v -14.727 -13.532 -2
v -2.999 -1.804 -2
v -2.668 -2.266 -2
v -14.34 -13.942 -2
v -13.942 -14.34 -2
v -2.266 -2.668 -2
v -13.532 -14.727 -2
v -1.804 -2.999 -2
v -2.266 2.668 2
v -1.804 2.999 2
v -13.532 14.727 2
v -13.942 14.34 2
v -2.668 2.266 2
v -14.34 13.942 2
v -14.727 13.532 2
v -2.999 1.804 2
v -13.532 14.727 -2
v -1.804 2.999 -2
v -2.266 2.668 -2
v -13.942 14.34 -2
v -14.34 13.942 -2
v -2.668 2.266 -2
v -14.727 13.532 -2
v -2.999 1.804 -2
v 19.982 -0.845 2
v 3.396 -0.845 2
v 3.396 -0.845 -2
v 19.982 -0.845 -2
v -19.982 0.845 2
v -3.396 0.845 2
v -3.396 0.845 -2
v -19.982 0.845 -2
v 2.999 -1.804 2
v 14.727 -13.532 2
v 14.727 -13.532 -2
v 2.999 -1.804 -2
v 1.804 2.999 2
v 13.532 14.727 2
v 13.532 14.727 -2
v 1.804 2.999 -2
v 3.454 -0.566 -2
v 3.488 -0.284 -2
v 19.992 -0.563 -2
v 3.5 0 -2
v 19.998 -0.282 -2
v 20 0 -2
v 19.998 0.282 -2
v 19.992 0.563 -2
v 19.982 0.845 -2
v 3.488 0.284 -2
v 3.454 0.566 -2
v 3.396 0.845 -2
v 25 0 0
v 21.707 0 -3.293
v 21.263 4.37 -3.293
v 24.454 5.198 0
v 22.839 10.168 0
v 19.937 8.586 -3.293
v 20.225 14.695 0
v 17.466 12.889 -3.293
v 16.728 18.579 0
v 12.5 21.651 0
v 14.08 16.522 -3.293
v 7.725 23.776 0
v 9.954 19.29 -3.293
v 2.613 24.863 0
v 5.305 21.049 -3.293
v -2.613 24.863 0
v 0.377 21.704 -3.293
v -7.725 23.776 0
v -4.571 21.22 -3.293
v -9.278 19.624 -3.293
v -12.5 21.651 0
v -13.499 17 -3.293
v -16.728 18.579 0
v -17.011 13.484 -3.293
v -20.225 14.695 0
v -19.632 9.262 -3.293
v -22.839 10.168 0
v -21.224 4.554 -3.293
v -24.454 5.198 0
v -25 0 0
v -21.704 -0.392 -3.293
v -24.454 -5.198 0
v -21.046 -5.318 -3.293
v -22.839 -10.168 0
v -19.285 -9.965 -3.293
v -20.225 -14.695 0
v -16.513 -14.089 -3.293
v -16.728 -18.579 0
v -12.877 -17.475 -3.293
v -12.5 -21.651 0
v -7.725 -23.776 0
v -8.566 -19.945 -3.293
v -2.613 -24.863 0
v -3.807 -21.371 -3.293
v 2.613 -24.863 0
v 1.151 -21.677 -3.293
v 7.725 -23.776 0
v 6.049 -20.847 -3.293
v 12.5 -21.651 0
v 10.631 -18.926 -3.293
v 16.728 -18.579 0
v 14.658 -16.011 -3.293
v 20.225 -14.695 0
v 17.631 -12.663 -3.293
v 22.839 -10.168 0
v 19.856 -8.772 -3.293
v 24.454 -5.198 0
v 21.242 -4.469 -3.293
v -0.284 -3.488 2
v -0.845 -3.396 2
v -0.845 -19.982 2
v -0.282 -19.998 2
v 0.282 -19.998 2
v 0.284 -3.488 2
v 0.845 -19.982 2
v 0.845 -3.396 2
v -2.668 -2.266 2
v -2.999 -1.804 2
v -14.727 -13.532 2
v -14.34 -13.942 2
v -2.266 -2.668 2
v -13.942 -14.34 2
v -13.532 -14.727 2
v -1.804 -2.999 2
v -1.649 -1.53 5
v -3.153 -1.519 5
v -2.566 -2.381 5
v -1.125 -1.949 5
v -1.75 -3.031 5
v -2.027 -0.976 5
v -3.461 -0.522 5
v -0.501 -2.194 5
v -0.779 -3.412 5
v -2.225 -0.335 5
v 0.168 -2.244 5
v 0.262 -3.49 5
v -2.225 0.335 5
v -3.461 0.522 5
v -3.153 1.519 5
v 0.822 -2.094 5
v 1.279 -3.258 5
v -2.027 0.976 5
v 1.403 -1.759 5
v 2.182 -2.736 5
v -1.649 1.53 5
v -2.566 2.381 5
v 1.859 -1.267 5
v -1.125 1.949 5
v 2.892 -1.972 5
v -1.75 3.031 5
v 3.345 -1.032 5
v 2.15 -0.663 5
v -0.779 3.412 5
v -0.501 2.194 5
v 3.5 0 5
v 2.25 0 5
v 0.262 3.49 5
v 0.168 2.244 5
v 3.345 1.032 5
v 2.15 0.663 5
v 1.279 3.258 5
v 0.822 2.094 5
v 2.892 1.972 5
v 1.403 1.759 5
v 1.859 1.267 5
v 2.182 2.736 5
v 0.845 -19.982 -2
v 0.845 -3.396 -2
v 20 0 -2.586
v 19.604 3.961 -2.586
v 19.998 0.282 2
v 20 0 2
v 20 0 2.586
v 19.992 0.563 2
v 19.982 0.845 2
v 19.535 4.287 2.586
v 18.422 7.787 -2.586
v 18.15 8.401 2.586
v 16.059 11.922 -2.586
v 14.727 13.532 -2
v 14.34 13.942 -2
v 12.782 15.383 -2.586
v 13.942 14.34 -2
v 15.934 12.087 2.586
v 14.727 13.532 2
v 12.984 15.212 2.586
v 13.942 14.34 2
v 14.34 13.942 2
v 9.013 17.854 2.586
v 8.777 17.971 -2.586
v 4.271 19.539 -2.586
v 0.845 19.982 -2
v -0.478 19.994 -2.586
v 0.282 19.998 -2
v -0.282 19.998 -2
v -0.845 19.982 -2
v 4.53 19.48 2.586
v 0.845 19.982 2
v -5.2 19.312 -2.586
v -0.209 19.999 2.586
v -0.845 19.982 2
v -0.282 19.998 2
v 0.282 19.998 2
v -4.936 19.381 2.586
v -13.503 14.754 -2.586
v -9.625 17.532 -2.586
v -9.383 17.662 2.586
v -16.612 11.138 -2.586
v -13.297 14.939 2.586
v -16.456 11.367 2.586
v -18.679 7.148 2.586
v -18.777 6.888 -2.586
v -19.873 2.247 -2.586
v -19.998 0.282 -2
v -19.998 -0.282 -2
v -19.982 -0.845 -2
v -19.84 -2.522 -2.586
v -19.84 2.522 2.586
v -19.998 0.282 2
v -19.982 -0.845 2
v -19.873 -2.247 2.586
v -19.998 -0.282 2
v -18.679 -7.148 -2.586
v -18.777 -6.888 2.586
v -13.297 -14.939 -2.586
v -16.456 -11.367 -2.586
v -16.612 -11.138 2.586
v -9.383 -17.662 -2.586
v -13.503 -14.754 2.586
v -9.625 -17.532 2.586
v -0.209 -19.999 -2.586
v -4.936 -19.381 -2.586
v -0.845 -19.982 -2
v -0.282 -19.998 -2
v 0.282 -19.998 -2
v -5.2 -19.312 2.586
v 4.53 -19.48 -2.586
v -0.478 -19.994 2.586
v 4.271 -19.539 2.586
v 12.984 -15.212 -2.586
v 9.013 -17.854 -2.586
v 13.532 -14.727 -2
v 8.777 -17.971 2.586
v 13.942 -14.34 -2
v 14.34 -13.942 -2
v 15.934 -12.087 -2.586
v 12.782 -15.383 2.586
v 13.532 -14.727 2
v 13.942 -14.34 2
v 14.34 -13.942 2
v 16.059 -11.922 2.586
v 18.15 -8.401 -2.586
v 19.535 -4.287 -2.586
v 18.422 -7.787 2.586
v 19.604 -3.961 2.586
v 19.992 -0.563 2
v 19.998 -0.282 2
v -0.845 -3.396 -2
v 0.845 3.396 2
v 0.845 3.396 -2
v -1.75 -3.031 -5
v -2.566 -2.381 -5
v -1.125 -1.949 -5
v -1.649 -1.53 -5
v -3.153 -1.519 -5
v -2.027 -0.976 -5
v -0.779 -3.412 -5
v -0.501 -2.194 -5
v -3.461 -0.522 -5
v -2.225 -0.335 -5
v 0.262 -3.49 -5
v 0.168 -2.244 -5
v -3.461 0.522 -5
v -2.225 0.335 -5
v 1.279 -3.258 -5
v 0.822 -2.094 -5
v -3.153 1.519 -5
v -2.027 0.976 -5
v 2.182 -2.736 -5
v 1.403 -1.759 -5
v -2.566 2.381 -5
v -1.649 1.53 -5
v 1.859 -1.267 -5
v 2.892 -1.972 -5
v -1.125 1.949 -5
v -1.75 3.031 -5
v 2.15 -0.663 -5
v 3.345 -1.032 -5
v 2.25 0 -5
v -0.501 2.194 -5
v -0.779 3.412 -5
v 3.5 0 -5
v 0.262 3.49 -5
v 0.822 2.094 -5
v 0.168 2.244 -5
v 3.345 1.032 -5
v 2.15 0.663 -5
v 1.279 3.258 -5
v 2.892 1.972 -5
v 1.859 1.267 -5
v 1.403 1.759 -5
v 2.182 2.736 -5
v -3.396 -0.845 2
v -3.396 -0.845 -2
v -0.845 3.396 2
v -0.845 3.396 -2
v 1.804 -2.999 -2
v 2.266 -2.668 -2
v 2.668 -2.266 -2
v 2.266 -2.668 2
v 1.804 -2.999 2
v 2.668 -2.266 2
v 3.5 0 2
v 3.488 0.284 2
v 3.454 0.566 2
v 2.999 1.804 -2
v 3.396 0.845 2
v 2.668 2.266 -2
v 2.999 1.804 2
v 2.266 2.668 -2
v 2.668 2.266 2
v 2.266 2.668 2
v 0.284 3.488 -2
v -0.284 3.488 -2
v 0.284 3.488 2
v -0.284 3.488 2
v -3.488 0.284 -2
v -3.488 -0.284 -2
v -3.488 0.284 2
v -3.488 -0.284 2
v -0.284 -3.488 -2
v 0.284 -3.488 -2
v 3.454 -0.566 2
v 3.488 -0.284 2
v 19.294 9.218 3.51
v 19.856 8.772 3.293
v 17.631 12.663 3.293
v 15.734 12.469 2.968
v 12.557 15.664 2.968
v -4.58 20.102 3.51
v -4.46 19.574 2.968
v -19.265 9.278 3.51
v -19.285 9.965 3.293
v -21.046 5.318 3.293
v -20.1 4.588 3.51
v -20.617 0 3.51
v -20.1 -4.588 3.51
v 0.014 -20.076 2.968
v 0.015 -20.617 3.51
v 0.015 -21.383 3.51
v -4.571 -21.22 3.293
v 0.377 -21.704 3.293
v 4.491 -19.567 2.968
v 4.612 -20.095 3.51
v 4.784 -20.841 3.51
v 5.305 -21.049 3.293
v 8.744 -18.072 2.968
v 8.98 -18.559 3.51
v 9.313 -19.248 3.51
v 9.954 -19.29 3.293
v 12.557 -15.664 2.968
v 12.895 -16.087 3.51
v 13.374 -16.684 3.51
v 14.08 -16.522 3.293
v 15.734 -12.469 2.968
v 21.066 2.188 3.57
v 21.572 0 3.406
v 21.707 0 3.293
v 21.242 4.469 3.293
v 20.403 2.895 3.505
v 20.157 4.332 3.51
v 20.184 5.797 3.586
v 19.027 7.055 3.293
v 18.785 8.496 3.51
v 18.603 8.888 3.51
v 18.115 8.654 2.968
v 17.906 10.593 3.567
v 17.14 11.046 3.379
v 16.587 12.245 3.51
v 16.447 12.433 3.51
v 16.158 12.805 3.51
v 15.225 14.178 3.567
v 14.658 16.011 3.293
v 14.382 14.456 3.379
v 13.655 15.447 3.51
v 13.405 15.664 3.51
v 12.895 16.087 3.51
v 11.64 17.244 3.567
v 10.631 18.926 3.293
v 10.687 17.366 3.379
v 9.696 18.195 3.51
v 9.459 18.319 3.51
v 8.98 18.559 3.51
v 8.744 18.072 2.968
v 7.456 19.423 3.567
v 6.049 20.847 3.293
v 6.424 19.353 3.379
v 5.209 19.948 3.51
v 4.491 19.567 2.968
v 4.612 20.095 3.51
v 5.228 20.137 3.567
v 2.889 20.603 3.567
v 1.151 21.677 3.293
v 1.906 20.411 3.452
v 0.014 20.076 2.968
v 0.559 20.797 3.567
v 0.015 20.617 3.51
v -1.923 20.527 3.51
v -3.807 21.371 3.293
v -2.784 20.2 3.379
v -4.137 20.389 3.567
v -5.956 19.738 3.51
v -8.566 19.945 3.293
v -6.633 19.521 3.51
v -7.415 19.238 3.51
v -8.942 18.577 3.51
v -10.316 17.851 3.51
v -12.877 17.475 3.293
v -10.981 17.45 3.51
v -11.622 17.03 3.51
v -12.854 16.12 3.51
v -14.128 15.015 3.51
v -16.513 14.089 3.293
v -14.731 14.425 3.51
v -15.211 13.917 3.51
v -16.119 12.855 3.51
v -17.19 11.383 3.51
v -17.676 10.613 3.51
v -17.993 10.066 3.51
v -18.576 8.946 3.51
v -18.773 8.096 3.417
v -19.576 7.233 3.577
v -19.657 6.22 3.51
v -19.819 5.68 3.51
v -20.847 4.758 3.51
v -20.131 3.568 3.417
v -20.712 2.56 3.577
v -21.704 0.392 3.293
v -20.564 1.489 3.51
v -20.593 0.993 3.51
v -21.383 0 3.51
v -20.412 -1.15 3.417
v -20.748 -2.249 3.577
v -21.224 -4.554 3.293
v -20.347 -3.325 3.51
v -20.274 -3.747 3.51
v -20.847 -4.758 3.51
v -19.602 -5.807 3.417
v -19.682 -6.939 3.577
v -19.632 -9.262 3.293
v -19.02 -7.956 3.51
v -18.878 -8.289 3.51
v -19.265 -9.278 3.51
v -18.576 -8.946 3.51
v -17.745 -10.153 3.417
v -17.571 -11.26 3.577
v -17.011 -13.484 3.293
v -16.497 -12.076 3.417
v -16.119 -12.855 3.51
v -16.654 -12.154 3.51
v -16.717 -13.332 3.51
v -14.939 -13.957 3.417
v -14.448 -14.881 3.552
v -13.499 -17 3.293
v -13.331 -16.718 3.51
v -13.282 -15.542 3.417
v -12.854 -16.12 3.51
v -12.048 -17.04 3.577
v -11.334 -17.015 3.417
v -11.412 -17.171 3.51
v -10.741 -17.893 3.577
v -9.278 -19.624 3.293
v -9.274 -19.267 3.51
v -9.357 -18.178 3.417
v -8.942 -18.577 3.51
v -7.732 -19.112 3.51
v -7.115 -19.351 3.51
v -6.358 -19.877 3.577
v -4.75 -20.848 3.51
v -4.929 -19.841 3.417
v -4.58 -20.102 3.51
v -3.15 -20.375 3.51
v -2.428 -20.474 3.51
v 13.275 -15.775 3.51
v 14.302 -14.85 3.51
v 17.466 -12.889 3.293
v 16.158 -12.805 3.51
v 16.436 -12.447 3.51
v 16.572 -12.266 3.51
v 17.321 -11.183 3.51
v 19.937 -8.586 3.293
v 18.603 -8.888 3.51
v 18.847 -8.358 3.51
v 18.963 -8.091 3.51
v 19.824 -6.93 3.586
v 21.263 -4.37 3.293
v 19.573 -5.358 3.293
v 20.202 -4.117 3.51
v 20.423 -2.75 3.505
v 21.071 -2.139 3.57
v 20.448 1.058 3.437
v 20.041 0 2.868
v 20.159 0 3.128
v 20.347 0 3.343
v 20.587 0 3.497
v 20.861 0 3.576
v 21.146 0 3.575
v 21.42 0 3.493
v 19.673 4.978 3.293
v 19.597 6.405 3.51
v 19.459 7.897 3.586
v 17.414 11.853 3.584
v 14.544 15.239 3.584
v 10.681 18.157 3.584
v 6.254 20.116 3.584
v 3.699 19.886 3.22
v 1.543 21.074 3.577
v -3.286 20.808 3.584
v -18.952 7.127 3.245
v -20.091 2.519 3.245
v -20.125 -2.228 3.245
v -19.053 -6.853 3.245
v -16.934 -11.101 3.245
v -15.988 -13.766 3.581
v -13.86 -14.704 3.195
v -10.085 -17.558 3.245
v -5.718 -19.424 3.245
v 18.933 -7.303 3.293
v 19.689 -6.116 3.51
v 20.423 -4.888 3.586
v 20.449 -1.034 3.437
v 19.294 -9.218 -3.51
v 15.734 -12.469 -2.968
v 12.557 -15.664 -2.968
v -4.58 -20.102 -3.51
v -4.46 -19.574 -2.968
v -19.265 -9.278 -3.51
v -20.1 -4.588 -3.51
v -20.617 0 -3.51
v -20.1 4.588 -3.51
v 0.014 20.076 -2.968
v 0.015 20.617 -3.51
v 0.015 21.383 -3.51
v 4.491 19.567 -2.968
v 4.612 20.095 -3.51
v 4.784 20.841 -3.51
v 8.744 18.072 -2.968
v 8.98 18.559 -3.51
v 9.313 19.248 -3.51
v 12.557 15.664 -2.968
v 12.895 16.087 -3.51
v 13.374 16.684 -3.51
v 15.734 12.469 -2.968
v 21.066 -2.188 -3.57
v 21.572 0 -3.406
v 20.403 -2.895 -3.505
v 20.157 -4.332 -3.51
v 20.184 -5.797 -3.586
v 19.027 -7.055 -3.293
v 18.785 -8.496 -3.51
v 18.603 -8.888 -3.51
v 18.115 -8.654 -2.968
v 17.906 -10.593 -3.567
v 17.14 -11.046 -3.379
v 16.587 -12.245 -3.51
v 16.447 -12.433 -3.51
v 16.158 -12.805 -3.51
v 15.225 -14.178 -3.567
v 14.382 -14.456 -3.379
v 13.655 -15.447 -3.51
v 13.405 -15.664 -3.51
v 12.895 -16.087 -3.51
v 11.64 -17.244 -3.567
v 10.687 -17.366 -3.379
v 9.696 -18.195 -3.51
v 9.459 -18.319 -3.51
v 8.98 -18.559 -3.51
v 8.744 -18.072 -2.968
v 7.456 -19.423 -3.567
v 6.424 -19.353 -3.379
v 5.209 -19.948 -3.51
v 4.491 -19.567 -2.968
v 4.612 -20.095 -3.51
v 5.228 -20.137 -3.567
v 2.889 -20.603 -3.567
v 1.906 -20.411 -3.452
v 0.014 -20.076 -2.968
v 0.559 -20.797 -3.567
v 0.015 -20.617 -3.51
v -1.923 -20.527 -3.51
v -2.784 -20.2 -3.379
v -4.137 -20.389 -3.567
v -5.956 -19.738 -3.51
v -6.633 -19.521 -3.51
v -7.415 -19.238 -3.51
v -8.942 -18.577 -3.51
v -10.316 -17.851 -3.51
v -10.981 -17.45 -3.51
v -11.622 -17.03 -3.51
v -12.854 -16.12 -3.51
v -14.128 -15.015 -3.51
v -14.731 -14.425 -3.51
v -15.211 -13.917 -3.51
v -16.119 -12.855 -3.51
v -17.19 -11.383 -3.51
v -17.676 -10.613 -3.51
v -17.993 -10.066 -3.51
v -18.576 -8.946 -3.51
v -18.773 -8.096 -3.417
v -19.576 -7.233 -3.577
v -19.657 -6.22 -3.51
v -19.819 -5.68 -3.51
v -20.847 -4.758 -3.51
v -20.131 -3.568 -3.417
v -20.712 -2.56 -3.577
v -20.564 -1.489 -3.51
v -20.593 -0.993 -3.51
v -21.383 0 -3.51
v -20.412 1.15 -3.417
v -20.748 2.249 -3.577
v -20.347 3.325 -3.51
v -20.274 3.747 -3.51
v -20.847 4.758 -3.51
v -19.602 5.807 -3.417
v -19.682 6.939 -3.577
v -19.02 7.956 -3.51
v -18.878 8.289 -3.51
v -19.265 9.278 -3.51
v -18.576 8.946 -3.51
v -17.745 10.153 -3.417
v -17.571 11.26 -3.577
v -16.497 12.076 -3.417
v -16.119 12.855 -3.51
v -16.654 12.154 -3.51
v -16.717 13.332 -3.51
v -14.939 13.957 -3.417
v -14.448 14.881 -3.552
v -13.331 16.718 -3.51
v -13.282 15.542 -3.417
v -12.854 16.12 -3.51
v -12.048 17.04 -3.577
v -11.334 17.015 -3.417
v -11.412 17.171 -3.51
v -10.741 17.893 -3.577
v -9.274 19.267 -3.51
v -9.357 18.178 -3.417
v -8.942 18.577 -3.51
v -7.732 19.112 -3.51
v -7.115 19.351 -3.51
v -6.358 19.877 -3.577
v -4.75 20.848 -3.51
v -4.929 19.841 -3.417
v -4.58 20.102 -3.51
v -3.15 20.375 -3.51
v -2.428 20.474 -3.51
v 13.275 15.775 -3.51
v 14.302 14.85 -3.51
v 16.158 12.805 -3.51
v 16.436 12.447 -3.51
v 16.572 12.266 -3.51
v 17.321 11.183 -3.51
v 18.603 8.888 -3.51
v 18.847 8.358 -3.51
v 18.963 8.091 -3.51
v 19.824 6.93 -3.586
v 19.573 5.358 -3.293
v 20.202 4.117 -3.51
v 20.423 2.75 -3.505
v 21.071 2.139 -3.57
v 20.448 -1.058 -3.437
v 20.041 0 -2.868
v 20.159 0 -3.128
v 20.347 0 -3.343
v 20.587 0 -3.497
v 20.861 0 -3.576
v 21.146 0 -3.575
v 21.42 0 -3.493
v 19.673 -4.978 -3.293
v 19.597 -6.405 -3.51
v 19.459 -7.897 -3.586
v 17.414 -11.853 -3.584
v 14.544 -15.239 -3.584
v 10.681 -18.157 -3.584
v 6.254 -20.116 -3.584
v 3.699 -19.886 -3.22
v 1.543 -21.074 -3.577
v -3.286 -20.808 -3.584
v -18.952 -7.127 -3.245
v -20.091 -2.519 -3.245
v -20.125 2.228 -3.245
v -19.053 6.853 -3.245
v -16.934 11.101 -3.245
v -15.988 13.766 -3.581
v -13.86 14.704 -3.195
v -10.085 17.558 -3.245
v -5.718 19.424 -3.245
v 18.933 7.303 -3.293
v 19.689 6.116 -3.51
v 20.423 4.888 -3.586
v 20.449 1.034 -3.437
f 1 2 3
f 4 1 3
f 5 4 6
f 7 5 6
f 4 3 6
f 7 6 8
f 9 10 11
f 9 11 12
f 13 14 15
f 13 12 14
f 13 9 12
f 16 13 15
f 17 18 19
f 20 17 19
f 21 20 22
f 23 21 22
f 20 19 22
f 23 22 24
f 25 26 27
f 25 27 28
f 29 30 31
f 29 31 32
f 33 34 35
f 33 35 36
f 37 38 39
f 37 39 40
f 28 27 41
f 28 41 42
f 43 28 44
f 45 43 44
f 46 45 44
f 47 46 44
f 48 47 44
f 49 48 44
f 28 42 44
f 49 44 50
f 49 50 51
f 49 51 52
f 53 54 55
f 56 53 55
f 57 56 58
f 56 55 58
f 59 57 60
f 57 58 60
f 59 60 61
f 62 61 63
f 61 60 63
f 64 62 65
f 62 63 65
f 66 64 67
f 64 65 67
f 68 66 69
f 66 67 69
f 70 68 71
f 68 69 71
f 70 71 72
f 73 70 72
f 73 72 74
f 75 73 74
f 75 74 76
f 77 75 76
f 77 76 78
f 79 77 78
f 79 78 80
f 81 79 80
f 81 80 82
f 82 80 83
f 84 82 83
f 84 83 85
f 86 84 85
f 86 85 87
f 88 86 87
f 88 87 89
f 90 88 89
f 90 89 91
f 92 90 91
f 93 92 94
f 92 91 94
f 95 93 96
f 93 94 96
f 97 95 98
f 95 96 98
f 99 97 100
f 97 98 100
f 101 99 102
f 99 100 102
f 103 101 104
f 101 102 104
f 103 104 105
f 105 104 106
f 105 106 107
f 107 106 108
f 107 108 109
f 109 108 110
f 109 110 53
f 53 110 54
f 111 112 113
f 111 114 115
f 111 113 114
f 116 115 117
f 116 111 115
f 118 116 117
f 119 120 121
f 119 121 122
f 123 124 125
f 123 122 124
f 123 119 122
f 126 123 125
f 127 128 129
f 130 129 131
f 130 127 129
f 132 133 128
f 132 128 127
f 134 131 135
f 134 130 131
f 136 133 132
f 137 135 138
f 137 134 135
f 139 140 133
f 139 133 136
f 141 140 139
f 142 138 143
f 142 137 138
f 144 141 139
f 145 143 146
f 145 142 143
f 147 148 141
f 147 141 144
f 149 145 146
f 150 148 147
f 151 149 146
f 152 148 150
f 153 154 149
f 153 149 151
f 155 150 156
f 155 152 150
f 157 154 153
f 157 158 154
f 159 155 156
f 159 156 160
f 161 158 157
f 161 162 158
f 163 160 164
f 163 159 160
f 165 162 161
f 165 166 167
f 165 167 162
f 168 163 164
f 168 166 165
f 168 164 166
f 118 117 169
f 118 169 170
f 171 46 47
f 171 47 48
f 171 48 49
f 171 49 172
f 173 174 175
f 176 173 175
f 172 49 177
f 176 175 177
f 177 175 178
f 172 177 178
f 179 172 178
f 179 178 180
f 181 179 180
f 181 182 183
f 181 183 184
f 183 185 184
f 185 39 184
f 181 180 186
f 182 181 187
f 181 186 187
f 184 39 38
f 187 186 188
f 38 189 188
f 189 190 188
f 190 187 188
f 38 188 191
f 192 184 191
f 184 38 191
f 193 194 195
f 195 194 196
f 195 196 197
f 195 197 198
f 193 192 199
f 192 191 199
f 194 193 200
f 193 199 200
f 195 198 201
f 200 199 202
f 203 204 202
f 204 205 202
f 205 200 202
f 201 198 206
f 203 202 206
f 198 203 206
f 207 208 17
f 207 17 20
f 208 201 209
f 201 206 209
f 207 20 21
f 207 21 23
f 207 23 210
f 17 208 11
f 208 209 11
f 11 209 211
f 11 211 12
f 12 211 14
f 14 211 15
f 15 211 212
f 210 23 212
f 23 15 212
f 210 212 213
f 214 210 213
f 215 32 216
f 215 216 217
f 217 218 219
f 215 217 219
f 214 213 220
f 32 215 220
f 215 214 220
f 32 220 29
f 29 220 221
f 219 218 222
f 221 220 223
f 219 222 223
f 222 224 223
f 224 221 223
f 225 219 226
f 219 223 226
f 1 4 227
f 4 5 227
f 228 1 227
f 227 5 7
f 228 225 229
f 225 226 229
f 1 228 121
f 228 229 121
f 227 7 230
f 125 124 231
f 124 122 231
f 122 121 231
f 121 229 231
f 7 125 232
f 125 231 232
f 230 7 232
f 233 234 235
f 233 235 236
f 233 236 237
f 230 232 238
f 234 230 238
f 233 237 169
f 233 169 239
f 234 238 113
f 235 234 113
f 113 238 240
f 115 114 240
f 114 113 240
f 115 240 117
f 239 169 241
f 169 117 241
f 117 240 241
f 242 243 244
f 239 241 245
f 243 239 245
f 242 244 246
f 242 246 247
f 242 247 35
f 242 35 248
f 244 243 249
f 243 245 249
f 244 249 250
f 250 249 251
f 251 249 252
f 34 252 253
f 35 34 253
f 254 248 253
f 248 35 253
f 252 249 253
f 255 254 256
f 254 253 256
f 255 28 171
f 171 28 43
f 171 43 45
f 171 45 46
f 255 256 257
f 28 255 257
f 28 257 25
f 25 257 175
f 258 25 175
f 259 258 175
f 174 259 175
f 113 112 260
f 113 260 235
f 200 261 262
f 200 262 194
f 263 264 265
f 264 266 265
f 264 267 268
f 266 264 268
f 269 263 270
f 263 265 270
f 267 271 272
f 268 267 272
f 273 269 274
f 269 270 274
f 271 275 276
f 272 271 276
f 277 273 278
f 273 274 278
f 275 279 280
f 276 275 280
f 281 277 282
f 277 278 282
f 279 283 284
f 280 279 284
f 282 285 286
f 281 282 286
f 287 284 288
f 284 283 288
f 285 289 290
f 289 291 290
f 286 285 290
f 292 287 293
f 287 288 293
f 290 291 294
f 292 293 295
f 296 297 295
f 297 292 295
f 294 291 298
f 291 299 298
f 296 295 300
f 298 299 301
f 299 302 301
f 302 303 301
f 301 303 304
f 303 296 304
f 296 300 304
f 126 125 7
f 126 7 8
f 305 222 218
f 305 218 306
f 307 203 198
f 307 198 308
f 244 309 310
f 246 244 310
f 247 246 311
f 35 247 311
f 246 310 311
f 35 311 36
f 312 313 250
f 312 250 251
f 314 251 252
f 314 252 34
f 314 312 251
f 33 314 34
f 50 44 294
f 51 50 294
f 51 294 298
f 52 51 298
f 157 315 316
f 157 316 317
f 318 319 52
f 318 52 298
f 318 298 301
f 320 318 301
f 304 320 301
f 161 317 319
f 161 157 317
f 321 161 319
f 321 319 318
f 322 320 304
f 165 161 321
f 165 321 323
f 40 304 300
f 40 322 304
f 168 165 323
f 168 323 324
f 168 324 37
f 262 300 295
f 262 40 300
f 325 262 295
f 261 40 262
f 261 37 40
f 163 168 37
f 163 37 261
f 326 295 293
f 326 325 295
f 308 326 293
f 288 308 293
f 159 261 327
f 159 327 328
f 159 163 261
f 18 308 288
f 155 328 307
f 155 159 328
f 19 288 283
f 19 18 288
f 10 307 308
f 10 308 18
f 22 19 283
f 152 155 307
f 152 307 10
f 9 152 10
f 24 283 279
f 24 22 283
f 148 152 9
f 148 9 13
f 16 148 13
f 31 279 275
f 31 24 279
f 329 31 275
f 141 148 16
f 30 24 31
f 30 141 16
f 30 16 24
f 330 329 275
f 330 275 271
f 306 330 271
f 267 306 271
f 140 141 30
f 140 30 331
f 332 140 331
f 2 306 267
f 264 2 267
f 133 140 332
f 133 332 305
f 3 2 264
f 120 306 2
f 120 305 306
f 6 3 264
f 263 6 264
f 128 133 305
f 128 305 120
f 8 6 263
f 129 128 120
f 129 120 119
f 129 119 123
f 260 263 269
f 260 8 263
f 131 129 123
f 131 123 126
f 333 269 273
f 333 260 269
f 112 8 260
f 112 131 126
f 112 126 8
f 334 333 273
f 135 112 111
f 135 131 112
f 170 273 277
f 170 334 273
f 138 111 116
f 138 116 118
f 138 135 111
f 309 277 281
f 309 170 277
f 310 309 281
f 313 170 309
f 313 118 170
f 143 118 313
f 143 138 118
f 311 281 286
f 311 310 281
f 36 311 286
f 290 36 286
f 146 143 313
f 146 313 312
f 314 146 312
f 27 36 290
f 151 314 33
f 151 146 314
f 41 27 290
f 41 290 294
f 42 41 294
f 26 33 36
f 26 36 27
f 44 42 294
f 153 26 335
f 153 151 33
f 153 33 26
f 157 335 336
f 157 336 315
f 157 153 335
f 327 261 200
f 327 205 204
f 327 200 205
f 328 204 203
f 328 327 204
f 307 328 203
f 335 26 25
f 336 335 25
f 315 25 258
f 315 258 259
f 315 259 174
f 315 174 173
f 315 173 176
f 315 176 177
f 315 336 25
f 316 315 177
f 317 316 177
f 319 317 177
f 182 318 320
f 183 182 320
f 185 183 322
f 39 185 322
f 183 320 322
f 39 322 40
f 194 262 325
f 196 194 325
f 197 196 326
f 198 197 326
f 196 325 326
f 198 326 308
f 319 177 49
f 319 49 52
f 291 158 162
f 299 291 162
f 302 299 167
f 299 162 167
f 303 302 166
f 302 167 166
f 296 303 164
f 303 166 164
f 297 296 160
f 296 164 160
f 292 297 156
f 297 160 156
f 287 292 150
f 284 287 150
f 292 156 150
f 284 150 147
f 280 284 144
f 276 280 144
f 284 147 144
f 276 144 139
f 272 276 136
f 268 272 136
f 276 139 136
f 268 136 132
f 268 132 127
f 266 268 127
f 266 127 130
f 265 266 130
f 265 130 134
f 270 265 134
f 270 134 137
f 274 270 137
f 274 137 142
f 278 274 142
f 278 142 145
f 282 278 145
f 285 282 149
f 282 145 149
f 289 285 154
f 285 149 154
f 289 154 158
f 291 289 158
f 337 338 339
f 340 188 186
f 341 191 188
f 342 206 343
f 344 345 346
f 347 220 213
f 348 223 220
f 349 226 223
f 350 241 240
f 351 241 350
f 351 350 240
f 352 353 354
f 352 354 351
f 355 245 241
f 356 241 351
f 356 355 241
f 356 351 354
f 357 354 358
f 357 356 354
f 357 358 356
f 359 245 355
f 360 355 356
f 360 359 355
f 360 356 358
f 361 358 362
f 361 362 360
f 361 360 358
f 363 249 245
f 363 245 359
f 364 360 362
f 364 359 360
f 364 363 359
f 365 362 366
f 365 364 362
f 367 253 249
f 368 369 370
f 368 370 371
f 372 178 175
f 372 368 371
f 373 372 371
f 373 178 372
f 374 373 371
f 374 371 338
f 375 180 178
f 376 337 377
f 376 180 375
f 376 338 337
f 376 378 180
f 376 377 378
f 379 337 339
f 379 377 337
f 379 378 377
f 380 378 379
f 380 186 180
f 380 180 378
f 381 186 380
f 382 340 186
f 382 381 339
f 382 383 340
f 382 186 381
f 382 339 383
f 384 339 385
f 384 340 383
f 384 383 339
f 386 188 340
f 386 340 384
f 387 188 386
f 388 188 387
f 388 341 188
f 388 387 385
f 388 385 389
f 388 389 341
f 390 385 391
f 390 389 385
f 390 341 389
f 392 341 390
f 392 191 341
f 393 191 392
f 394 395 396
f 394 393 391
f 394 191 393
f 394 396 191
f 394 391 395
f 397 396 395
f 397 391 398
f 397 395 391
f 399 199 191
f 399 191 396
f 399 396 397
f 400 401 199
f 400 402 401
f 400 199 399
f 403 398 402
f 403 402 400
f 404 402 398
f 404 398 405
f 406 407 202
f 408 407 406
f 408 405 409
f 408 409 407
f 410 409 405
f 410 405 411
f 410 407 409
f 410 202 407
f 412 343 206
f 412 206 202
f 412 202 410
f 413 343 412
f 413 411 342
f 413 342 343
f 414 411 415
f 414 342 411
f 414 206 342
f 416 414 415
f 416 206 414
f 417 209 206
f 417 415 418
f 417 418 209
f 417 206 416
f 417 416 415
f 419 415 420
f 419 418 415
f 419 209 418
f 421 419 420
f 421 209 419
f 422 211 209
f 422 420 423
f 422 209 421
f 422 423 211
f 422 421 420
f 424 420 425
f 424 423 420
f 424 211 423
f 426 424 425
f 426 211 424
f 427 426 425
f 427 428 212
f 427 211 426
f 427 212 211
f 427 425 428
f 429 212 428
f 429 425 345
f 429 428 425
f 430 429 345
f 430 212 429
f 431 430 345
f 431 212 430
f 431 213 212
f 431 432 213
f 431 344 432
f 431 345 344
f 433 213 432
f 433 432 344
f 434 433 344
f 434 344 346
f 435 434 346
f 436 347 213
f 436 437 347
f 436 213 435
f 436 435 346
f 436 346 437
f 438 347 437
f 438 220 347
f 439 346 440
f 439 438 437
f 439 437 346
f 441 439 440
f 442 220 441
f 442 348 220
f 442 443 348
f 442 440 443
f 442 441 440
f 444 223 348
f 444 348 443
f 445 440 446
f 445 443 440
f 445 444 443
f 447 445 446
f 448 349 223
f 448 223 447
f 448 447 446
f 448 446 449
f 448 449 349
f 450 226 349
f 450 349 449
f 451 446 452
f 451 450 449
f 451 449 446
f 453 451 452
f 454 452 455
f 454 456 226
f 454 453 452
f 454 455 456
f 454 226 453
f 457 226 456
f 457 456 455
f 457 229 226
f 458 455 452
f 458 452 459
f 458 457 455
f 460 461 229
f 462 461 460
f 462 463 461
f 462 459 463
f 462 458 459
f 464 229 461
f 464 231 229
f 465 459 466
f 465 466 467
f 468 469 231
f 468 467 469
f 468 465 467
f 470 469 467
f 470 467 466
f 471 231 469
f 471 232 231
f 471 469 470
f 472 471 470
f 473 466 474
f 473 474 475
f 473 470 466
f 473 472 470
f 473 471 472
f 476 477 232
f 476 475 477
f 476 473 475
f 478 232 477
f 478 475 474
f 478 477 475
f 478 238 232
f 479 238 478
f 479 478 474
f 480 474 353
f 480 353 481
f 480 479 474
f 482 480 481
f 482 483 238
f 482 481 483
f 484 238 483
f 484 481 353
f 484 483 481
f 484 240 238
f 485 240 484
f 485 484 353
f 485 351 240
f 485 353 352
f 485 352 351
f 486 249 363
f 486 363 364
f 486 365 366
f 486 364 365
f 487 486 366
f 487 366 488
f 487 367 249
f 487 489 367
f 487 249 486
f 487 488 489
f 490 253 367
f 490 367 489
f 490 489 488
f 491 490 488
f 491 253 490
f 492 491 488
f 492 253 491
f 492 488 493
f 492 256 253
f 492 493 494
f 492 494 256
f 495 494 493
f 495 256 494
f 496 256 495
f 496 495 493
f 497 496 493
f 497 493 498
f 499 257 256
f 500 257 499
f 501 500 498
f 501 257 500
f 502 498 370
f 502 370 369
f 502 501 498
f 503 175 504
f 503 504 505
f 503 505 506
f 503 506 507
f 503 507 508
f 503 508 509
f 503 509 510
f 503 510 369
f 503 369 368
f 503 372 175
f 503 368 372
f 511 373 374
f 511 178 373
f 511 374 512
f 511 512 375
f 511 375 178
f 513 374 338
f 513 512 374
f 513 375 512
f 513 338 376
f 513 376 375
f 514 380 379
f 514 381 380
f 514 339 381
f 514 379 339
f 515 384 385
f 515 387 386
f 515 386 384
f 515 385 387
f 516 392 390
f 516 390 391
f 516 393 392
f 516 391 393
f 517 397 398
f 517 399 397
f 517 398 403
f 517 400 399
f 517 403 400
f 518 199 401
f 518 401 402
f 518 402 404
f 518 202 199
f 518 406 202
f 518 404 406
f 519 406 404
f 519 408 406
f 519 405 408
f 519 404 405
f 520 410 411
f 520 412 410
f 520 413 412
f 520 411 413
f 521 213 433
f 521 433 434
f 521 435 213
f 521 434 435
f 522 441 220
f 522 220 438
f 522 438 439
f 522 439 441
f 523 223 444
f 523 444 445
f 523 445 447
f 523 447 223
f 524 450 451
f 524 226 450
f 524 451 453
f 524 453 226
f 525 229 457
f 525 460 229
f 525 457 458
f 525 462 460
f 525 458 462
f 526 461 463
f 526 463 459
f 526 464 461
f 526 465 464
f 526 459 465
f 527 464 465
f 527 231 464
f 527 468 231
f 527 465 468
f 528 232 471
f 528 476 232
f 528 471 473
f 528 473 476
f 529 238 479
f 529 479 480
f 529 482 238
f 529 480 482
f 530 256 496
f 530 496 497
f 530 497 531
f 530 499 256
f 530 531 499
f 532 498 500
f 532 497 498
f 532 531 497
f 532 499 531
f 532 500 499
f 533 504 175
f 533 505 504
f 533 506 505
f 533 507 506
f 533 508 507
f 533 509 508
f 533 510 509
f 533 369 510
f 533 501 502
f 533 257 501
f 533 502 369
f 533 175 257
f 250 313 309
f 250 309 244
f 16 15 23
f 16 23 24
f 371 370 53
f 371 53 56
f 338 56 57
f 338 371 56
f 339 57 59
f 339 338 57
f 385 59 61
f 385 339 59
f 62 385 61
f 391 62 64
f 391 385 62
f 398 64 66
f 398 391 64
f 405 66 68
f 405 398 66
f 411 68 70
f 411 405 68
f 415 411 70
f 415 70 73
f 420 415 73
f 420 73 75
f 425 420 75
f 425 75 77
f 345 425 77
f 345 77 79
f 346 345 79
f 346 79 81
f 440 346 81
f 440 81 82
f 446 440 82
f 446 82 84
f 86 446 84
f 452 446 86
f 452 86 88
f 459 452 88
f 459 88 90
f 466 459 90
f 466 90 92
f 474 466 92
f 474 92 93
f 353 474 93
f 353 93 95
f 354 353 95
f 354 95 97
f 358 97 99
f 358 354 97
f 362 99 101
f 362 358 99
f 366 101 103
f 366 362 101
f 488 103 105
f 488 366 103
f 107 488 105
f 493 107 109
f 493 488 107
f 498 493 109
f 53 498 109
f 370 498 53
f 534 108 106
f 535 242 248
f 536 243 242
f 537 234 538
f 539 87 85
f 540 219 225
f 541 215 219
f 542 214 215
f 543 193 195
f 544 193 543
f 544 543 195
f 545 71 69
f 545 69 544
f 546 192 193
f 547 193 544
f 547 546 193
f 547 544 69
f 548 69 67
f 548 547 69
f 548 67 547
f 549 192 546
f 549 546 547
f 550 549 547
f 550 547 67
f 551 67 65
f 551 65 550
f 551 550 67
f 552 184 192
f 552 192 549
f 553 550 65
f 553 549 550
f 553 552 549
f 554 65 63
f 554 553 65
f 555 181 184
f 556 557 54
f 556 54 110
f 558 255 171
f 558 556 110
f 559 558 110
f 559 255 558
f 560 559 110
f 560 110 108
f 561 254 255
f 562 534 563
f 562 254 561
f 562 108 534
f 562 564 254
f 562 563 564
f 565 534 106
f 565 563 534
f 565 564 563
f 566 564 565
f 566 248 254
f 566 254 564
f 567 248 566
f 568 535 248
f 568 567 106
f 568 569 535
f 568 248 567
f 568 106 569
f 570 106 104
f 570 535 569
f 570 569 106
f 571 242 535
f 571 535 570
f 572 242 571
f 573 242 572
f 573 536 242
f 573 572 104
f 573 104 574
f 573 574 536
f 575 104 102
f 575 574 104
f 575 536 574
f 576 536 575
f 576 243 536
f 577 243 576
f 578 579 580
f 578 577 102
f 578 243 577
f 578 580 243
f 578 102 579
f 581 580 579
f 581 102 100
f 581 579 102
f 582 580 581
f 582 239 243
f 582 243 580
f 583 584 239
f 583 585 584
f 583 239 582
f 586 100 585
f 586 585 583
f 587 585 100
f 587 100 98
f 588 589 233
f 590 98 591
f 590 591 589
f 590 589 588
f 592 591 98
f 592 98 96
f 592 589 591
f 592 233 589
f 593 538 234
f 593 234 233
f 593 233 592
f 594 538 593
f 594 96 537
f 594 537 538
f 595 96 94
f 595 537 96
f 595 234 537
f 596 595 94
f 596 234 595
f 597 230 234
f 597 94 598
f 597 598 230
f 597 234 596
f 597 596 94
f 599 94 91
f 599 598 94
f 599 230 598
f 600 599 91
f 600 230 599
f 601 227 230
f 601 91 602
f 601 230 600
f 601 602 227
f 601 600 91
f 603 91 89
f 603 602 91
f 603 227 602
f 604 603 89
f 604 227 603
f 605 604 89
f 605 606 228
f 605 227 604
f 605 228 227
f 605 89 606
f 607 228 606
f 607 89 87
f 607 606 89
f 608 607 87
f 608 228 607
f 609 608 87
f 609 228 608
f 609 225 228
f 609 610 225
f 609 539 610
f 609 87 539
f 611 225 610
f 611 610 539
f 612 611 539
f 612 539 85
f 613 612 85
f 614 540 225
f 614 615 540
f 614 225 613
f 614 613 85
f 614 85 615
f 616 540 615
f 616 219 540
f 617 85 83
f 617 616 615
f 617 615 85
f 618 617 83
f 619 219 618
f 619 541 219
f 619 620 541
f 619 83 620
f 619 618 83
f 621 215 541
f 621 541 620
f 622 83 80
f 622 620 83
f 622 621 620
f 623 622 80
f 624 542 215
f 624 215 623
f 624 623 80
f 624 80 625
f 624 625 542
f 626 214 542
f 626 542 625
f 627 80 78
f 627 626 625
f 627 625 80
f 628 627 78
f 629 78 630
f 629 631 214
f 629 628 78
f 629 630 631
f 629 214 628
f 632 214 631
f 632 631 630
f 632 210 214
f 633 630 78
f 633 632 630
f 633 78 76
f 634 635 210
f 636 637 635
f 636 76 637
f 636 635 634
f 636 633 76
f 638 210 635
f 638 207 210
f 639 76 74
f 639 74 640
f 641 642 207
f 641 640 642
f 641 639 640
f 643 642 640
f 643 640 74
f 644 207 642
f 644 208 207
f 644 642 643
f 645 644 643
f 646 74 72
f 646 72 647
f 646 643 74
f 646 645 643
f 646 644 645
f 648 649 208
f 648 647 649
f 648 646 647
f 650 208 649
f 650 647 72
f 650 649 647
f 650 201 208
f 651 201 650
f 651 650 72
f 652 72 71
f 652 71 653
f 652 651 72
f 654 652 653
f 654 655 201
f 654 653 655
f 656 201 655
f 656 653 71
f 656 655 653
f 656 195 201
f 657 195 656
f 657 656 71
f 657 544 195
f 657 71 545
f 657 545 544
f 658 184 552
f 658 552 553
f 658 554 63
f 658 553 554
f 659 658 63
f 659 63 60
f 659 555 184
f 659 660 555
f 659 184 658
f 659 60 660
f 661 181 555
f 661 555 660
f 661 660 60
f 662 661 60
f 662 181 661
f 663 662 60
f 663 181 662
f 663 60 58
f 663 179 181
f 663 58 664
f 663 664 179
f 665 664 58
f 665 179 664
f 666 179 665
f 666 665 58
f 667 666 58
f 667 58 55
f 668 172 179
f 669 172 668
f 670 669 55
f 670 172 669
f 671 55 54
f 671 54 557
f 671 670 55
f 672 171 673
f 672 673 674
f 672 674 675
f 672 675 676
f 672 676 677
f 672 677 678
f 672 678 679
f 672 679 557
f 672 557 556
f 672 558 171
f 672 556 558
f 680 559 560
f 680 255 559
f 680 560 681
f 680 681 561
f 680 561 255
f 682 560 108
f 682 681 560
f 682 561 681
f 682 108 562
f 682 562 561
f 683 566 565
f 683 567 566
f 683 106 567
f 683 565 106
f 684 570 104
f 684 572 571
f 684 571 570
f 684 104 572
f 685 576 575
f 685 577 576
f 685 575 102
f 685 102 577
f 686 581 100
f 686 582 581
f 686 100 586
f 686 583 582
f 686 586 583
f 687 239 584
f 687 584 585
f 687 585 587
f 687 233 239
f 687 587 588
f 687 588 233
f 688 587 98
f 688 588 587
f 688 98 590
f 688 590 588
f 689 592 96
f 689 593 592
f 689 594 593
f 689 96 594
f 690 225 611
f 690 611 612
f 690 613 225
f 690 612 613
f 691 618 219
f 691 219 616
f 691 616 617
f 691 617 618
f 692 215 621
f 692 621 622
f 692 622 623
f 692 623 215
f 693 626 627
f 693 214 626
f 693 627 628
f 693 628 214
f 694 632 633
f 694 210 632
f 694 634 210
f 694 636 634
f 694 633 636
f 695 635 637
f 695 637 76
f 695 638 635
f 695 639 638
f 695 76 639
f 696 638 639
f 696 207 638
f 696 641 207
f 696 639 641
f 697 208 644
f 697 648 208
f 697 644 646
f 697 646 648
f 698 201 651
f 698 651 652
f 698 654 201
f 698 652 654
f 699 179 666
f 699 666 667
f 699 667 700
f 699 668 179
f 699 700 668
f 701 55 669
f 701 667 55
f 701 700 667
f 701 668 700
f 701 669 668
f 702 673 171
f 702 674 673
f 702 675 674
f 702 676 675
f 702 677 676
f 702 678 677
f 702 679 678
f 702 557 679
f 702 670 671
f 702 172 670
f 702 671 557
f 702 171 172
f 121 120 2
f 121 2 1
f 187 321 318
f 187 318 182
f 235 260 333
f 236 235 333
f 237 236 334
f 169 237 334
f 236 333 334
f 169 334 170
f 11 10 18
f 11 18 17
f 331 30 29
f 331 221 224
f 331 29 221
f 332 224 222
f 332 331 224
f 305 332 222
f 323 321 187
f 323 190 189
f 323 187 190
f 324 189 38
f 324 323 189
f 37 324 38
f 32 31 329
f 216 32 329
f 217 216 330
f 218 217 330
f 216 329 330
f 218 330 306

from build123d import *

# Parameters (mm, degrees)
F0_R     = 25
F1_DEPTH = 5
F2_SIZE  = 4.99999
F3_R     = 20.00001
F3_R_2   = 3.5
F4_DEPTH = 25
F3_R_3   = 2.25
F5_DEPTH = 12.5
F7_DEPTH = 2
F9_COUNT = 8
F10_R    = 1


# Not quite as in the source:
# - a fillet or chamfer is up to 0.001 mm smaller than in the source, because OpenCascade refuses the exact size


with BuildPart() as f1:
    # F0 (on Top) → F1 (new body, symmetric)
    with BuildSketch(Plane.XY):
        Circle(F0_R)
    extrude(amount=F1_DEPTH, both=True)

    # F2 (size 5 in the source; OpenCascade refuses exactly that, so slightly less here)
    f2_edges = [f1.edges().sort_by_distance(p)[0] for p in [
        (-25, 0, -5),
        (25, 0, 0),
        (-25, 0, 5),
    ]]
    chamfer(f2_edges, length=F2_SIZE)

    # F3 (on face) → F4 (cut)
    with BuildSketch(Plane.XY.offset(5)):
        Circle(F3_R)
        Circle(F3_R_2, mode=Mode.SUBTRACT)
    extrude(amount=-F4_DEPTH, mode=Mode.SUBTRACT)

    # F3 (on face) → F5 (cut, symmetric)
    with BuildSketch(Plane.XY.offset(5)):
        Circle(F3_R_3)
    extrude(amount=F5_DEPTH, both=True, mode=Mode.SUBTRACT)

    # F6 (on Top) → F7 (join, symmetric)
    with BuildSketch(Plane.XY):
        Polygon((0.8449734887, -2.9114803765), (0, -3.1155126635), (0, -21.5157922357), (0.8449734887, -21.5157922357), align=None)
        Polygon((0, -21.5157922357), (0, -3.1155126635), (-0.8449734887, -2.9114803765), (-0.8449734887, -21.5157922357), align=None)
    extrude(amount=F7_DEPTH, both=True)

    # F9: F1 ×8 about axis
    f9_axis = Axis((0, 0, 0.2882219851), (0, 0, -1))


with BuildPart() as f1_1:
    add(f1.part)
    for i in range(1, F9_COUNT):
        add(f1.part.rotate(f9_axis, i * 360 / F9_COUNT))

    # F10
    f10_edges = [f1_1.edges().sort_by_distance(p)[0] for p in [
        (-20.00001, 0, 5),
        (-20.00001, 0, -5),
    ]]
    fillet(f10_edges, radius=F10_R)


solid = f1_1.part
